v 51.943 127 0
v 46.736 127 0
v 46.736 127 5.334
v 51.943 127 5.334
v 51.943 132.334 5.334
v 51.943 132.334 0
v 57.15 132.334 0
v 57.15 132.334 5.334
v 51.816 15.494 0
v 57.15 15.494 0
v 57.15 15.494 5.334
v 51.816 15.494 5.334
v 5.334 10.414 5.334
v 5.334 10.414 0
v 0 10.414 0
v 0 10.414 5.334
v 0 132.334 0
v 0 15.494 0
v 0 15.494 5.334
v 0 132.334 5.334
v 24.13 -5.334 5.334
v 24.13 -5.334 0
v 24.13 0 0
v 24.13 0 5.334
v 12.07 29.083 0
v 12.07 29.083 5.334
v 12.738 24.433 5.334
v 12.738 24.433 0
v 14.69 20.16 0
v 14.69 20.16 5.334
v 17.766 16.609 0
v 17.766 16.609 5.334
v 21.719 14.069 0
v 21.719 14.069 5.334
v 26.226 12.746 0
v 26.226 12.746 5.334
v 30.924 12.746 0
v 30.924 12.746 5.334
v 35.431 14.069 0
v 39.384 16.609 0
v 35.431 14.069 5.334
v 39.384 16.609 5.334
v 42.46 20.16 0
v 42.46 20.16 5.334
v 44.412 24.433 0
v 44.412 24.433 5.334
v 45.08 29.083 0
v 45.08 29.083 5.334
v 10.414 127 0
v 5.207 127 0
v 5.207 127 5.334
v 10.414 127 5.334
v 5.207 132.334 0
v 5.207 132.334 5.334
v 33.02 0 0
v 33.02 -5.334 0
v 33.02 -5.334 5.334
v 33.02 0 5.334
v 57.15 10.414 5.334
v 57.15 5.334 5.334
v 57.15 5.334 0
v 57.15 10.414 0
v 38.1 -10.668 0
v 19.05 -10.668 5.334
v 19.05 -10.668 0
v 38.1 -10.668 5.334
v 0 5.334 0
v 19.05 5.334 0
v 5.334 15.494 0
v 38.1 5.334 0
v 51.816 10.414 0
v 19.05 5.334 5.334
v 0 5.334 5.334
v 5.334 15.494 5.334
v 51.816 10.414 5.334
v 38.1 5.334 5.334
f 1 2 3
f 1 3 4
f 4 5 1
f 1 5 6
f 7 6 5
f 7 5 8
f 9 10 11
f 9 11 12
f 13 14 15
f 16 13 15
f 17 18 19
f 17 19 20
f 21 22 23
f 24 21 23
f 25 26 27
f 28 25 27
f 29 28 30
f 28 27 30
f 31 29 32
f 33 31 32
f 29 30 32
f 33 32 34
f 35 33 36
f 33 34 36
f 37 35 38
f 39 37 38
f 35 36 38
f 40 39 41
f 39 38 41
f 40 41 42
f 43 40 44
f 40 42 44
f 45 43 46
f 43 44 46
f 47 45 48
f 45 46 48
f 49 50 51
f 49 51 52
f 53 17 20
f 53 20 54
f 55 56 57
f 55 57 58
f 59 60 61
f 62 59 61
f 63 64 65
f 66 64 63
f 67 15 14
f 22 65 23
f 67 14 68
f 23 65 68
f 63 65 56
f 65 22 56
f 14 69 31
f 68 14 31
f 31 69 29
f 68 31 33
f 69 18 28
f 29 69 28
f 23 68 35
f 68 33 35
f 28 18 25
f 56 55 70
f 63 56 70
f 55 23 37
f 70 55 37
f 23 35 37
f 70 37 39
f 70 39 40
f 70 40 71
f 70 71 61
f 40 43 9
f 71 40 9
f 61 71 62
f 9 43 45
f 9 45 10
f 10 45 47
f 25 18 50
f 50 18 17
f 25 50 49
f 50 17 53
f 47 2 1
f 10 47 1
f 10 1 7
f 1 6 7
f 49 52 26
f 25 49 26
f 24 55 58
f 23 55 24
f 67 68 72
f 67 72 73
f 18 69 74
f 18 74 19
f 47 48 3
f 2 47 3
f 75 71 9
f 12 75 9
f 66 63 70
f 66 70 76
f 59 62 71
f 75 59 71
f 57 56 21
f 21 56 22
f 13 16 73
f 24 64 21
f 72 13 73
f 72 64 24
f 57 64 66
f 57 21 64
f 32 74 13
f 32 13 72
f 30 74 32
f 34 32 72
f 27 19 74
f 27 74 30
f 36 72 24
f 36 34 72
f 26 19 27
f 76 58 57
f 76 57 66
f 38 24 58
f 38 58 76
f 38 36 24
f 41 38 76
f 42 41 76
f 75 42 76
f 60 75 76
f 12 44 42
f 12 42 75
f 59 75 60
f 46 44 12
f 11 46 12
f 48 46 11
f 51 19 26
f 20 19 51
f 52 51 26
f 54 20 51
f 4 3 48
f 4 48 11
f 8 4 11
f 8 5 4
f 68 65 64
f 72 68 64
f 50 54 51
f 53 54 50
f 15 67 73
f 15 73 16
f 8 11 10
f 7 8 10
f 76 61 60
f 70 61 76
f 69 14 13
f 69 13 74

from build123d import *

# Parameters (mm, degrees)
SKETCH8_W           = 57.15
SKETCH8_H           = 127
BOSS_EXTRUDE3_DEPTH = 5.334
SKETCH9_R           = 16.505180298
CUT_EXTRUDE4_DEPTH  = 140.368483008
SKETCH12_W          = 19.05
SKETCH12_H          = 5.334
CUT_EXTRUDE8_DEPTH  = 5.334
SKETCH14_W          = 10.414
SKETCH14_H          = 5.334
BOSS_EXTRUDE4_DEPTH = 5.334
SKETCH15_W          = 5.207
SKETCH15_H          = 5.334
CUT_EXTRUDE9_DEPTH  = 5.334
SKETCH22_W          = 19.05
SKETCH22_H          = 5.334
BOSS_EXTRUDE5_DEPTH = 10.668
SKETCH23_W          = 8.89
SKETCH23_H          = 5.334
CUT_EXTRUDE15_DEPTH = 145.245837417
SKETCH24_W          = 5.334
SKETCH24_H          = 5.08
CUT_EXTRUDE16_DEPTH = 145.245837417


with BuildPart() as part:
    # Sketch8 → Boss-Extrude3 (new body)
    with BuildSketch(Plane.XY):
        with Locations((28.575, 63.5)):
            Rectangle(SKETCH8_W, SKETCH8_H)
    extrude(amount=BOSS_EXTRUDE3_DEPTH)

    # Sketch9 → Cut-Extrude4 (cut, through all)
    with BuildSketch(Plane.XY.offset(5.334)):
        with BuildLine():
            Line((46.736, 127), (10.414, 127))
            Line((10.414, 127), (12.069819702, 29.083))
            ThreePointArc((12.069819702, 29.083), (28.575, 45.588180298), (45.080180298, 29.083))
            Line((45.080180298, 29.083), (46.736, 127))
        make_face()
        with Locations((28.575, 29.083)):
            Circle(SKETCH9_R)
    extrude(amount=-CUT_EXTRUDE4_DEPTH, mode=Mode.SUBTRACT)

    # Sketch12 → Cut-Extrude8 (cut)
    with BuildSketch(Plane(origin=(0, 0, 0), x_dir=(-1, 0, 0), z_dir=(0, -1, 0))):
        with Locations((-47.625, -2.667)):
            Rectangle(SKETCH12_W, SKETCH12_H)
        with Locations((-9.525, -2.667)):
            Rectangle(SKETCH12_W, SKETCH12_H)
    extrude(amount=-CUT_EXTRUDE8_DEPTH, mode=Mode.SUBTRACT)

    # Sketch14 → Boss-Extrude4 (add)
    with BuildSketch(Plane(origin=(0, 127, 0), x_dir=(1, 0, 0), z_dir=(0, 1, 0))):
        with Locations((51.943, -2.667)):
            Rectangle(SKETCH14_W, SKETCH14_H)
        with Locations((5.207, -2.667)):
            Rectangle(SKETCH14_W, SKETCH14_H)
    extrude(amount=BOSS_EXTRUDE4_DEPTH)

    # Sketch15 → Cut-Extrude9 (cut)
    with BuildSketch(Plane(origin=(0, 132.334, 0), x_dir=(1, 0, 0), z_dir=(0, 1, 0))):
        with Locations((7.8105, -2.667)):
            Rectangle(SKETCH15_W, SKETCH15_H)
        with Locations((49.3395, -2.667)):
            Rectangle(SKETCH15_W, SKETCH15_H)
    extrude(amount=-CUT_EXTRUDE9_DEPTH, mode=Mode.SUBTRACT)

    # Sketch22 → Boss-Extrude5 (add)
    with BuildSketch(Plane.XZ):
        with Locations((28.575, 2.667)):
            Rectangle(SKETCH22_W, SKETCH22_H)
    extrude(amount=BOSS_EXTRUDE5_DEPTH)

    # Sketch23 → Cut-Extrude15 (cut, through all)
    with BuildSketch(Plane(origin=(0, 0, 0), x_dir=(-1, 0, 0), z_dir=(0, 0, -1))):
        with Locations((-28.575, -2.667)):
            Rectangle(SKETCH23_W, SKETCH23_H)
    extrude(amount=-CUT_EXTRUDE15_DEPTH, mode=Mode.SUBTRACT)

    # Sketch24 → Cut-Extrude16 (cut, through all)
    with BuildSketch(Plane(origin=(0, 0, 0), x_dir=(-1, 0, 0), z_dir=(0, 0, -1))):
        with Locations((-54.483, 12.954)):
            Rectangle(SKETCH24_W, SKETCH24_H)
        with Locations((-2.667, 12.954)):
            Rectangle(SKETCH24_W, SKETCH24_H)
    extrude(amount=-CUT_EXTRUDE16_DEPTH, mode=Mode.SUBTRACT)


solid = part.part
